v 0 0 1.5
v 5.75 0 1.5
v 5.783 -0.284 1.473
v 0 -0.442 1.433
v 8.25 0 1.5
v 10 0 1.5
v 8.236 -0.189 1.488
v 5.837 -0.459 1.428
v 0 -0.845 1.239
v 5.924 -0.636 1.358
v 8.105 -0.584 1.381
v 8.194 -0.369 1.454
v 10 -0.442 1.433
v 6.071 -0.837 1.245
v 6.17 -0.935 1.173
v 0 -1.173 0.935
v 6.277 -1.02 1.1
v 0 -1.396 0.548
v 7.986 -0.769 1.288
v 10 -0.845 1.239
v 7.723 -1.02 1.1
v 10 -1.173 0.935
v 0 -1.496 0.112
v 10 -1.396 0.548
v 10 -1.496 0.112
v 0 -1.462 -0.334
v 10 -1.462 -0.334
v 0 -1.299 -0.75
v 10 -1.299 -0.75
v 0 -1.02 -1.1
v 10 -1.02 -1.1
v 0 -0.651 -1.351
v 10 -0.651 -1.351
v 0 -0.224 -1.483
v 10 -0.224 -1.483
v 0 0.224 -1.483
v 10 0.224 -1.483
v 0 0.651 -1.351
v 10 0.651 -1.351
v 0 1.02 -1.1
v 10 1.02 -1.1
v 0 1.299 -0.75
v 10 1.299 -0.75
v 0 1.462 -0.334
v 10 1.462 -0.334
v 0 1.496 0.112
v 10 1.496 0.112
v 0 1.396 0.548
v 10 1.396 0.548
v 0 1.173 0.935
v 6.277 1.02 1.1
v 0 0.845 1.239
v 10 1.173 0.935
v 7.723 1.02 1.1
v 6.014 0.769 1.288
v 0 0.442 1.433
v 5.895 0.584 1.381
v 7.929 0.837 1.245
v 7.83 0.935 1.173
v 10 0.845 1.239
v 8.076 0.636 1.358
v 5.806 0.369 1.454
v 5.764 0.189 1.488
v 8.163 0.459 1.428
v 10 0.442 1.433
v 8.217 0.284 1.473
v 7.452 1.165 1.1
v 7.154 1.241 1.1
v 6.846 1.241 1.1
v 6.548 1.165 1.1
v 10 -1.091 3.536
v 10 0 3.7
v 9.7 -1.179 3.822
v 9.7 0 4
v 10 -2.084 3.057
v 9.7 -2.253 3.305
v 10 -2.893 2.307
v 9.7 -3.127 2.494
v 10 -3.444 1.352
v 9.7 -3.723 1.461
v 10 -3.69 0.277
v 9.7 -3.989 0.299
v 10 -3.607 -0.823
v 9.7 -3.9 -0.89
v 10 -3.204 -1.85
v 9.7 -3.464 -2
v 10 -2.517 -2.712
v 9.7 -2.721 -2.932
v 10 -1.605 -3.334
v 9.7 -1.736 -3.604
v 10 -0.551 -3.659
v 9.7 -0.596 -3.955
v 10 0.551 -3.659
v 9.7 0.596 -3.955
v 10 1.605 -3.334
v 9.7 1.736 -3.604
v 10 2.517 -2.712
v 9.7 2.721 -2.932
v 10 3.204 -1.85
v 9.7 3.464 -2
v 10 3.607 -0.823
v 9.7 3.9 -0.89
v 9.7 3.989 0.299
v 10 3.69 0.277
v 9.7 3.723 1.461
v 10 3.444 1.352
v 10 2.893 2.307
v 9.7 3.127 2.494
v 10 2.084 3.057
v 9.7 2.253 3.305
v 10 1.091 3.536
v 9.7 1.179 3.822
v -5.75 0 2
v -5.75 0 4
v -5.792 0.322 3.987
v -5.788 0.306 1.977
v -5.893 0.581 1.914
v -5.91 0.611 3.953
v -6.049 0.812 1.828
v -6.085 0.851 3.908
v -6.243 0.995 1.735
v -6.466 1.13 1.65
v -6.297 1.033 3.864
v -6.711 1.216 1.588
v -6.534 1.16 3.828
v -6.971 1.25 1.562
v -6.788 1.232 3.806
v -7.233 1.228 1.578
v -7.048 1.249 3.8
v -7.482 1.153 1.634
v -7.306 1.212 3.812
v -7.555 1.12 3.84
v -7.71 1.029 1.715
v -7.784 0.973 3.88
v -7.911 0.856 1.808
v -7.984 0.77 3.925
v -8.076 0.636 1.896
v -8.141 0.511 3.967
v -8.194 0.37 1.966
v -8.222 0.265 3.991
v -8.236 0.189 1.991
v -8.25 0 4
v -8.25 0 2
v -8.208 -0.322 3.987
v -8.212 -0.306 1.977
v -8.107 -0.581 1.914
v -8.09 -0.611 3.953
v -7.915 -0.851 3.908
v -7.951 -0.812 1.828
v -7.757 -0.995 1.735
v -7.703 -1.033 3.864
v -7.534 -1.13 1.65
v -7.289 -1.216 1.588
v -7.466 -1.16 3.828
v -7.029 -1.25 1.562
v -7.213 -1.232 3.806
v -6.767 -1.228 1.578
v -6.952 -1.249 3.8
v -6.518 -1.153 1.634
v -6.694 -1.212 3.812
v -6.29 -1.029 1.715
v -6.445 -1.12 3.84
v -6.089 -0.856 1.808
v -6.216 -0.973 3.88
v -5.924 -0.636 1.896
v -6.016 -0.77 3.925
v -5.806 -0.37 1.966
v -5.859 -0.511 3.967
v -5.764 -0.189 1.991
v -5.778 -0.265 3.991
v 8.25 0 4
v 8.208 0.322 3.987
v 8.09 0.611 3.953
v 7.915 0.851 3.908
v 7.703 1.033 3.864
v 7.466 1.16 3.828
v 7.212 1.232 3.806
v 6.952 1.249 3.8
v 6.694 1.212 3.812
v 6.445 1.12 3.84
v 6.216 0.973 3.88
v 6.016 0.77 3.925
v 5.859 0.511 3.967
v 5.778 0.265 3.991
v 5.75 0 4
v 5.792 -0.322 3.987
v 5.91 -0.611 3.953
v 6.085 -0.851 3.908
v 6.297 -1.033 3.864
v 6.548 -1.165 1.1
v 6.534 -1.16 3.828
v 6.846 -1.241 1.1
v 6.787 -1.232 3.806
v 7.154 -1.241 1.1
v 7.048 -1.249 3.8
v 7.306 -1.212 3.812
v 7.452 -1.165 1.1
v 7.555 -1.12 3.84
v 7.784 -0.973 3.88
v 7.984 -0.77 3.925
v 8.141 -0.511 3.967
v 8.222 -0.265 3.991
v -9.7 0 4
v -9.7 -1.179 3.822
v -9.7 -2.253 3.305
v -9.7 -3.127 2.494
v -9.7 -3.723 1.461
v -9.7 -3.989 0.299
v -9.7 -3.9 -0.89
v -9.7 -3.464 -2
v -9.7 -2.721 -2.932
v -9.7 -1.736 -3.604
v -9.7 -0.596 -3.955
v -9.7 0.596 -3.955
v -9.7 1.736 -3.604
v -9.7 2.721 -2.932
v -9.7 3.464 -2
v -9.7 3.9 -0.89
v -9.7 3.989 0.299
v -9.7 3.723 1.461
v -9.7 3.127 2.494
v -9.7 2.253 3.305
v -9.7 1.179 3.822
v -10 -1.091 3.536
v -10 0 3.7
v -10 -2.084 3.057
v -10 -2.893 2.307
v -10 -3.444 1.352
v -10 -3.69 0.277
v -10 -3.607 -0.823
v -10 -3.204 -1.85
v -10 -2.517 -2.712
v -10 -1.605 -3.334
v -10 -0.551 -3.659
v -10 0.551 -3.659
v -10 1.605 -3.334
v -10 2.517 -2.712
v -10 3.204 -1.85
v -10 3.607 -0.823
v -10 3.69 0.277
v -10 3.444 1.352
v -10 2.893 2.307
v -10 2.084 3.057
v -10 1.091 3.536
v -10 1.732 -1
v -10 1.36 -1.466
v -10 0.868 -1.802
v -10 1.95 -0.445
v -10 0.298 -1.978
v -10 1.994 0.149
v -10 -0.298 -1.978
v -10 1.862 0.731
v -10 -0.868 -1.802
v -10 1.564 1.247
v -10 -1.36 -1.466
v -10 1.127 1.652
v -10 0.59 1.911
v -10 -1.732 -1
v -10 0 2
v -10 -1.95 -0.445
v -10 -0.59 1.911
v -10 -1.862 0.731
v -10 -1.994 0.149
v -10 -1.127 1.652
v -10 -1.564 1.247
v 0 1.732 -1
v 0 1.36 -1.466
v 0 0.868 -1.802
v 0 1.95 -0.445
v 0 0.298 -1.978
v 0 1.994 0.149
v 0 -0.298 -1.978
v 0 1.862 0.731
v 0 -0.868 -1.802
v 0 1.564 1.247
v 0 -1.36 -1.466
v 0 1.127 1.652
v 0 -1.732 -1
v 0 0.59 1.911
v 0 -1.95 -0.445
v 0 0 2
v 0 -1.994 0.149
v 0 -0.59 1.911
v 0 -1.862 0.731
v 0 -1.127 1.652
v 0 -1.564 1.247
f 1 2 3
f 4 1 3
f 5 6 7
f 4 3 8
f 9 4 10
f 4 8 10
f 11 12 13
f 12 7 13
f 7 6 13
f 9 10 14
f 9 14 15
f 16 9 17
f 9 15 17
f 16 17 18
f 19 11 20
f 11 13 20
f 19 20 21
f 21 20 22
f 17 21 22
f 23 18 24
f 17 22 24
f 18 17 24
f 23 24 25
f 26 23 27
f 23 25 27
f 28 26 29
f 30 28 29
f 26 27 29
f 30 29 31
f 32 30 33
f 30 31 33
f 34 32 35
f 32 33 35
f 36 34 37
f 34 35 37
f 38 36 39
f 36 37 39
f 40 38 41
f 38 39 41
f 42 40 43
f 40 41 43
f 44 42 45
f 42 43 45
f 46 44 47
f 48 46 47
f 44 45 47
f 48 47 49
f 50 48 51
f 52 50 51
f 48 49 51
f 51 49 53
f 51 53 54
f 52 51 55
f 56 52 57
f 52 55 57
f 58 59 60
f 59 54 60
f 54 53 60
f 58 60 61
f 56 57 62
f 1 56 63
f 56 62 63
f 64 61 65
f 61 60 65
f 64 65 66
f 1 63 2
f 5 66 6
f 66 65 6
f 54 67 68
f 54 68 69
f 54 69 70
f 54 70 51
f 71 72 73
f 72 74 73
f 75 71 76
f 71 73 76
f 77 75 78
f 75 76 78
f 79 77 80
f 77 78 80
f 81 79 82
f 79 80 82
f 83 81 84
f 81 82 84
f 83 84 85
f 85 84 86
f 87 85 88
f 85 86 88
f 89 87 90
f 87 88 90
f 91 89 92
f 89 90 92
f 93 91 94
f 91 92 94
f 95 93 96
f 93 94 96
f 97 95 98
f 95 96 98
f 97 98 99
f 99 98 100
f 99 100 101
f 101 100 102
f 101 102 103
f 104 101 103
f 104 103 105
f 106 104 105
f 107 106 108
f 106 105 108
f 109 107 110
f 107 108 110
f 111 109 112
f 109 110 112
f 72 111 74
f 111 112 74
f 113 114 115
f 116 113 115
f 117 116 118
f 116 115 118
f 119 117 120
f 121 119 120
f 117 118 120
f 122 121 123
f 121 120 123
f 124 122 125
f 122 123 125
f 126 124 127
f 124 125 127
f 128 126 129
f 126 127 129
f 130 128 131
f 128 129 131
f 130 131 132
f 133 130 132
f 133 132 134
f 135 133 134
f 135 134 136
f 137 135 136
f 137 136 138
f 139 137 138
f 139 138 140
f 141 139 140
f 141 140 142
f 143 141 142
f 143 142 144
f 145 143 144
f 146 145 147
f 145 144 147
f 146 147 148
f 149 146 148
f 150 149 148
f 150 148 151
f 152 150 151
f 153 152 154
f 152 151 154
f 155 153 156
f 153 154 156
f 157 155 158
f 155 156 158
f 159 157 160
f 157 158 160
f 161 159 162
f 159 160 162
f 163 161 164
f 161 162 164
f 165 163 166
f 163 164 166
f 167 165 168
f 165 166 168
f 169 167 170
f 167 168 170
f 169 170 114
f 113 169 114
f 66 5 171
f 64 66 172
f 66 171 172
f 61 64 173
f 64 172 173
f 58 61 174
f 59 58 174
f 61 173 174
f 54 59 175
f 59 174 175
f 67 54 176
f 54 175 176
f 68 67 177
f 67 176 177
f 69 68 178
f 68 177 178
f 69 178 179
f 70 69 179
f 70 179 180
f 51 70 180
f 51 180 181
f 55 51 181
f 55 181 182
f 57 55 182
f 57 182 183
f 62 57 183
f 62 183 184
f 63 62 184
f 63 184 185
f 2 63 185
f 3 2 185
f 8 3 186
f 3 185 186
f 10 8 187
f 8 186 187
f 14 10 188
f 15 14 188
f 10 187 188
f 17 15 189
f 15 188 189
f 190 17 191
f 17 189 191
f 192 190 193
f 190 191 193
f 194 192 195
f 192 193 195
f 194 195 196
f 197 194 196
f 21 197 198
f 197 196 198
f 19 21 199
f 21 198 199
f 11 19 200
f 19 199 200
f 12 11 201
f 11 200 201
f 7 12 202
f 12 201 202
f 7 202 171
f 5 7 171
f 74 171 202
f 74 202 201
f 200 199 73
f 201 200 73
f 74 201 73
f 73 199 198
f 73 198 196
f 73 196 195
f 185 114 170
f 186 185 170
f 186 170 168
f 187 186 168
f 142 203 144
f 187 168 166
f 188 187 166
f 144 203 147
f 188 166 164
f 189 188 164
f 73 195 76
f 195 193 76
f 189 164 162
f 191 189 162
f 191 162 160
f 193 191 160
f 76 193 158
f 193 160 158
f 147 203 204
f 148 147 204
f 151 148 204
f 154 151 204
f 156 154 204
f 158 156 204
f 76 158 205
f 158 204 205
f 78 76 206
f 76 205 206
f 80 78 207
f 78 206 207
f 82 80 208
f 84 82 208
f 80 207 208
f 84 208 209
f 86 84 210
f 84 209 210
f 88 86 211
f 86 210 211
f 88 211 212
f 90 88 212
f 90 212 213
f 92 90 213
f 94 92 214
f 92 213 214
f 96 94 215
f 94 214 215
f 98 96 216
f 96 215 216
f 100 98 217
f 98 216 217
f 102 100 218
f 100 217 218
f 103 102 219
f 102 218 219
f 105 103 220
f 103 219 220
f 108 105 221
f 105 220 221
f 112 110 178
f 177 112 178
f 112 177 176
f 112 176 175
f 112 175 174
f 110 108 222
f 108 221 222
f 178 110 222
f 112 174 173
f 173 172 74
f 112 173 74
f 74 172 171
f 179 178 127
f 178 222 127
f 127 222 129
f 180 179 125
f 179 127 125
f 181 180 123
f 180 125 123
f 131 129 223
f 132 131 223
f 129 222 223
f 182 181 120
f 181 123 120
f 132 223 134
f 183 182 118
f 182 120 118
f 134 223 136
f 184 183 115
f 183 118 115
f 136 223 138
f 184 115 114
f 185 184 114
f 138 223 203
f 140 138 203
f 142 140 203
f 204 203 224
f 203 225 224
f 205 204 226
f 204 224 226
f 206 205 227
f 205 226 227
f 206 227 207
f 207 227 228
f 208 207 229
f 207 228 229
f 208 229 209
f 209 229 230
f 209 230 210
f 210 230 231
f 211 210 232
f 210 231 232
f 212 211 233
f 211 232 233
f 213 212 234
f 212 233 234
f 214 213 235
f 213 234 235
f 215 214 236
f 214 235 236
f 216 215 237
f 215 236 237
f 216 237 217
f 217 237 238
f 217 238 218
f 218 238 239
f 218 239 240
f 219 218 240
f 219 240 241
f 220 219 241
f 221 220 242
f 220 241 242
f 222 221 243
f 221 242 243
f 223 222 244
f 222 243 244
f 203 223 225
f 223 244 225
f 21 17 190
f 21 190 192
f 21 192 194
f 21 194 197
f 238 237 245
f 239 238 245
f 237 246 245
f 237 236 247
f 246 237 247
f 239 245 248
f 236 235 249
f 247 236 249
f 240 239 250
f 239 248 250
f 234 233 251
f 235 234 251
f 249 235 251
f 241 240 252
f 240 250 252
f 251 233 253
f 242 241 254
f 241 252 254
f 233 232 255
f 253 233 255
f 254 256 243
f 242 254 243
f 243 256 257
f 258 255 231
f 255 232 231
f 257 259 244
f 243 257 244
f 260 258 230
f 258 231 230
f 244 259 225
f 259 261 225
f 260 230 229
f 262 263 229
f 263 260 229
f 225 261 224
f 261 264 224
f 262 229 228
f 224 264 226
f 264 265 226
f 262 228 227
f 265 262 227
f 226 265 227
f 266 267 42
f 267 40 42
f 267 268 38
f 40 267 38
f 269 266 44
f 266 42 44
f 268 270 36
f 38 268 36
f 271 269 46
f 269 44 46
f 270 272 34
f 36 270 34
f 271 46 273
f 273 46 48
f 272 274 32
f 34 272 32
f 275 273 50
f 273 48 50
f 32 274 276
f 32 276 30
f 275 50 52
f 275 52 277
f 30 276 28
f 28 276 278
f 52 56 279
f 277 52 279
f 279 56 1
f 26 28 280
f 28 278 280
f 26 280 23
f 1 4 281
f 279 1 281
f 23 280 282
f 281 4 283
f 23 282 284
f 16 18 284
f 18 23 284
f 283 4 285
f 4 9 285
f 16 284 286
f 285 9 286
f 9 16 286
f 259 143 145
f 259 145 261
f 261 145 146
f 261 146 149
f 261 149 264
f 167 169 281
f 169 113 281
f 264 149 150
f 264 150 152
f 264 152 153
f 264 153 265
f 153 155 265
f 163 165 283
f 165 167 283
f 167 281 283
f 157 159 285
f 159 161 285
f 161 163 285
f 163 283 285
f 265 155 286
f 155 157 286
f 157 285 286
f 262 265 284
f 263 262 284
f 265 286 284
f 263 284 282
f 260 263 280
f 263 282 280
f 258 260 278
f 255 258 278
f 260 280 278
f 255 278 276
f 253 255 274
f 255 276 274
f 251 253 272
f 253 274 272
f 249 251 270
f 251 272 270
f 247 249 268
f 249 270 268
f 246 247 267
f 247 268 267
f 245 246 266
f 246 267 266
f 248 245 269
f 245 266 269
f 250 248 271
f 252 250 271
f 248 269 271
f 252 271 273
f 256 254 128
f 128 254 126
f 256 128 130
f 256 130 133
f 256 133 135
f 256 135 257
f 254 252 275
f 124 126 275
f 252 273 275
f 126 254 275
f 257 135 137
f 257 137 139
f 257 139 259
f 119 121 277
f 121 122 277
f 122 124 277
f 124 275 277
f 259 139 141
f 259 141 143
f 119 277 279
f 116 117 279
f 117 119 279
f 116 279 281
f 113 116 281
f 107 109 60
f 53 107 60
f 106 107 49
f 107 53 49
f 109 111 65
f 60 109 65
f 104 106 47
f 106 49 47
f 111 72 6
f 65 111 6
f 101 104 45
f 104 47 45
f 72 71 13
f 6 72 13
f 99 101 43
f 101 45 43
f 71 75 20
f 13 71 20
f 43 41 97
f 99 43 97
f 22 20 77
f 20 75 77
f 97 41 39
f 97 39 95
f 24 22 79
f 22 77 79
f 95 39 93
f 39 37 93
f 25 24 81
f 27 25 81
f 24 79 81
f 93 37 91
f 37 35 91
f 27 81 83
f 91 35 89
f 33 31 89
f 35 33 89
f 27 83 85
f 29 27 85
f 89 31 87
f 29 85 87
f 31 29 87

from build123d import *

# Parameters (mm, degrees)
ESQUISSE2_R             = 1.25
ENL_V_MAT_EXTRU_1_DEPTH = 5


with BuildPart() as part:
    # Esquisse1 → Révolution1 (revolve)
    with BuildSketch(Plane.XY, mode=Mode.PRIVATE) as r_volution1_sk:
        Polygon((-10, 3.7), (-10, 2), (0, 2), (0, 1.5), (10, 1.5), (10, 3.7), (9.7, 4), (-9.7, 4), align=None)
    revolve(r_volution1_sk.sketch.rotate(Axis((-9.079951531, 0, 0), (1, 0, 0)), 90), axis=Axis((-9.079951531, 0, 0), (1, 0, 0)))

    # Esquisse2 → Enlèv. mat.-Extru.1 (cut)
    with BuildSketch(Plane.XY.offset(6.1)):
        with Locations((-7, 0)):
            Circle(ESQUISSE2_R)
        with Locations((7, 0)):
            Circle(ESQUISSE2_R)
    extrude(amount=-ENL_V_MAT_EXTRU_1_DEPTH, mode=Mode.SUBTRACT)


solid = part.part
